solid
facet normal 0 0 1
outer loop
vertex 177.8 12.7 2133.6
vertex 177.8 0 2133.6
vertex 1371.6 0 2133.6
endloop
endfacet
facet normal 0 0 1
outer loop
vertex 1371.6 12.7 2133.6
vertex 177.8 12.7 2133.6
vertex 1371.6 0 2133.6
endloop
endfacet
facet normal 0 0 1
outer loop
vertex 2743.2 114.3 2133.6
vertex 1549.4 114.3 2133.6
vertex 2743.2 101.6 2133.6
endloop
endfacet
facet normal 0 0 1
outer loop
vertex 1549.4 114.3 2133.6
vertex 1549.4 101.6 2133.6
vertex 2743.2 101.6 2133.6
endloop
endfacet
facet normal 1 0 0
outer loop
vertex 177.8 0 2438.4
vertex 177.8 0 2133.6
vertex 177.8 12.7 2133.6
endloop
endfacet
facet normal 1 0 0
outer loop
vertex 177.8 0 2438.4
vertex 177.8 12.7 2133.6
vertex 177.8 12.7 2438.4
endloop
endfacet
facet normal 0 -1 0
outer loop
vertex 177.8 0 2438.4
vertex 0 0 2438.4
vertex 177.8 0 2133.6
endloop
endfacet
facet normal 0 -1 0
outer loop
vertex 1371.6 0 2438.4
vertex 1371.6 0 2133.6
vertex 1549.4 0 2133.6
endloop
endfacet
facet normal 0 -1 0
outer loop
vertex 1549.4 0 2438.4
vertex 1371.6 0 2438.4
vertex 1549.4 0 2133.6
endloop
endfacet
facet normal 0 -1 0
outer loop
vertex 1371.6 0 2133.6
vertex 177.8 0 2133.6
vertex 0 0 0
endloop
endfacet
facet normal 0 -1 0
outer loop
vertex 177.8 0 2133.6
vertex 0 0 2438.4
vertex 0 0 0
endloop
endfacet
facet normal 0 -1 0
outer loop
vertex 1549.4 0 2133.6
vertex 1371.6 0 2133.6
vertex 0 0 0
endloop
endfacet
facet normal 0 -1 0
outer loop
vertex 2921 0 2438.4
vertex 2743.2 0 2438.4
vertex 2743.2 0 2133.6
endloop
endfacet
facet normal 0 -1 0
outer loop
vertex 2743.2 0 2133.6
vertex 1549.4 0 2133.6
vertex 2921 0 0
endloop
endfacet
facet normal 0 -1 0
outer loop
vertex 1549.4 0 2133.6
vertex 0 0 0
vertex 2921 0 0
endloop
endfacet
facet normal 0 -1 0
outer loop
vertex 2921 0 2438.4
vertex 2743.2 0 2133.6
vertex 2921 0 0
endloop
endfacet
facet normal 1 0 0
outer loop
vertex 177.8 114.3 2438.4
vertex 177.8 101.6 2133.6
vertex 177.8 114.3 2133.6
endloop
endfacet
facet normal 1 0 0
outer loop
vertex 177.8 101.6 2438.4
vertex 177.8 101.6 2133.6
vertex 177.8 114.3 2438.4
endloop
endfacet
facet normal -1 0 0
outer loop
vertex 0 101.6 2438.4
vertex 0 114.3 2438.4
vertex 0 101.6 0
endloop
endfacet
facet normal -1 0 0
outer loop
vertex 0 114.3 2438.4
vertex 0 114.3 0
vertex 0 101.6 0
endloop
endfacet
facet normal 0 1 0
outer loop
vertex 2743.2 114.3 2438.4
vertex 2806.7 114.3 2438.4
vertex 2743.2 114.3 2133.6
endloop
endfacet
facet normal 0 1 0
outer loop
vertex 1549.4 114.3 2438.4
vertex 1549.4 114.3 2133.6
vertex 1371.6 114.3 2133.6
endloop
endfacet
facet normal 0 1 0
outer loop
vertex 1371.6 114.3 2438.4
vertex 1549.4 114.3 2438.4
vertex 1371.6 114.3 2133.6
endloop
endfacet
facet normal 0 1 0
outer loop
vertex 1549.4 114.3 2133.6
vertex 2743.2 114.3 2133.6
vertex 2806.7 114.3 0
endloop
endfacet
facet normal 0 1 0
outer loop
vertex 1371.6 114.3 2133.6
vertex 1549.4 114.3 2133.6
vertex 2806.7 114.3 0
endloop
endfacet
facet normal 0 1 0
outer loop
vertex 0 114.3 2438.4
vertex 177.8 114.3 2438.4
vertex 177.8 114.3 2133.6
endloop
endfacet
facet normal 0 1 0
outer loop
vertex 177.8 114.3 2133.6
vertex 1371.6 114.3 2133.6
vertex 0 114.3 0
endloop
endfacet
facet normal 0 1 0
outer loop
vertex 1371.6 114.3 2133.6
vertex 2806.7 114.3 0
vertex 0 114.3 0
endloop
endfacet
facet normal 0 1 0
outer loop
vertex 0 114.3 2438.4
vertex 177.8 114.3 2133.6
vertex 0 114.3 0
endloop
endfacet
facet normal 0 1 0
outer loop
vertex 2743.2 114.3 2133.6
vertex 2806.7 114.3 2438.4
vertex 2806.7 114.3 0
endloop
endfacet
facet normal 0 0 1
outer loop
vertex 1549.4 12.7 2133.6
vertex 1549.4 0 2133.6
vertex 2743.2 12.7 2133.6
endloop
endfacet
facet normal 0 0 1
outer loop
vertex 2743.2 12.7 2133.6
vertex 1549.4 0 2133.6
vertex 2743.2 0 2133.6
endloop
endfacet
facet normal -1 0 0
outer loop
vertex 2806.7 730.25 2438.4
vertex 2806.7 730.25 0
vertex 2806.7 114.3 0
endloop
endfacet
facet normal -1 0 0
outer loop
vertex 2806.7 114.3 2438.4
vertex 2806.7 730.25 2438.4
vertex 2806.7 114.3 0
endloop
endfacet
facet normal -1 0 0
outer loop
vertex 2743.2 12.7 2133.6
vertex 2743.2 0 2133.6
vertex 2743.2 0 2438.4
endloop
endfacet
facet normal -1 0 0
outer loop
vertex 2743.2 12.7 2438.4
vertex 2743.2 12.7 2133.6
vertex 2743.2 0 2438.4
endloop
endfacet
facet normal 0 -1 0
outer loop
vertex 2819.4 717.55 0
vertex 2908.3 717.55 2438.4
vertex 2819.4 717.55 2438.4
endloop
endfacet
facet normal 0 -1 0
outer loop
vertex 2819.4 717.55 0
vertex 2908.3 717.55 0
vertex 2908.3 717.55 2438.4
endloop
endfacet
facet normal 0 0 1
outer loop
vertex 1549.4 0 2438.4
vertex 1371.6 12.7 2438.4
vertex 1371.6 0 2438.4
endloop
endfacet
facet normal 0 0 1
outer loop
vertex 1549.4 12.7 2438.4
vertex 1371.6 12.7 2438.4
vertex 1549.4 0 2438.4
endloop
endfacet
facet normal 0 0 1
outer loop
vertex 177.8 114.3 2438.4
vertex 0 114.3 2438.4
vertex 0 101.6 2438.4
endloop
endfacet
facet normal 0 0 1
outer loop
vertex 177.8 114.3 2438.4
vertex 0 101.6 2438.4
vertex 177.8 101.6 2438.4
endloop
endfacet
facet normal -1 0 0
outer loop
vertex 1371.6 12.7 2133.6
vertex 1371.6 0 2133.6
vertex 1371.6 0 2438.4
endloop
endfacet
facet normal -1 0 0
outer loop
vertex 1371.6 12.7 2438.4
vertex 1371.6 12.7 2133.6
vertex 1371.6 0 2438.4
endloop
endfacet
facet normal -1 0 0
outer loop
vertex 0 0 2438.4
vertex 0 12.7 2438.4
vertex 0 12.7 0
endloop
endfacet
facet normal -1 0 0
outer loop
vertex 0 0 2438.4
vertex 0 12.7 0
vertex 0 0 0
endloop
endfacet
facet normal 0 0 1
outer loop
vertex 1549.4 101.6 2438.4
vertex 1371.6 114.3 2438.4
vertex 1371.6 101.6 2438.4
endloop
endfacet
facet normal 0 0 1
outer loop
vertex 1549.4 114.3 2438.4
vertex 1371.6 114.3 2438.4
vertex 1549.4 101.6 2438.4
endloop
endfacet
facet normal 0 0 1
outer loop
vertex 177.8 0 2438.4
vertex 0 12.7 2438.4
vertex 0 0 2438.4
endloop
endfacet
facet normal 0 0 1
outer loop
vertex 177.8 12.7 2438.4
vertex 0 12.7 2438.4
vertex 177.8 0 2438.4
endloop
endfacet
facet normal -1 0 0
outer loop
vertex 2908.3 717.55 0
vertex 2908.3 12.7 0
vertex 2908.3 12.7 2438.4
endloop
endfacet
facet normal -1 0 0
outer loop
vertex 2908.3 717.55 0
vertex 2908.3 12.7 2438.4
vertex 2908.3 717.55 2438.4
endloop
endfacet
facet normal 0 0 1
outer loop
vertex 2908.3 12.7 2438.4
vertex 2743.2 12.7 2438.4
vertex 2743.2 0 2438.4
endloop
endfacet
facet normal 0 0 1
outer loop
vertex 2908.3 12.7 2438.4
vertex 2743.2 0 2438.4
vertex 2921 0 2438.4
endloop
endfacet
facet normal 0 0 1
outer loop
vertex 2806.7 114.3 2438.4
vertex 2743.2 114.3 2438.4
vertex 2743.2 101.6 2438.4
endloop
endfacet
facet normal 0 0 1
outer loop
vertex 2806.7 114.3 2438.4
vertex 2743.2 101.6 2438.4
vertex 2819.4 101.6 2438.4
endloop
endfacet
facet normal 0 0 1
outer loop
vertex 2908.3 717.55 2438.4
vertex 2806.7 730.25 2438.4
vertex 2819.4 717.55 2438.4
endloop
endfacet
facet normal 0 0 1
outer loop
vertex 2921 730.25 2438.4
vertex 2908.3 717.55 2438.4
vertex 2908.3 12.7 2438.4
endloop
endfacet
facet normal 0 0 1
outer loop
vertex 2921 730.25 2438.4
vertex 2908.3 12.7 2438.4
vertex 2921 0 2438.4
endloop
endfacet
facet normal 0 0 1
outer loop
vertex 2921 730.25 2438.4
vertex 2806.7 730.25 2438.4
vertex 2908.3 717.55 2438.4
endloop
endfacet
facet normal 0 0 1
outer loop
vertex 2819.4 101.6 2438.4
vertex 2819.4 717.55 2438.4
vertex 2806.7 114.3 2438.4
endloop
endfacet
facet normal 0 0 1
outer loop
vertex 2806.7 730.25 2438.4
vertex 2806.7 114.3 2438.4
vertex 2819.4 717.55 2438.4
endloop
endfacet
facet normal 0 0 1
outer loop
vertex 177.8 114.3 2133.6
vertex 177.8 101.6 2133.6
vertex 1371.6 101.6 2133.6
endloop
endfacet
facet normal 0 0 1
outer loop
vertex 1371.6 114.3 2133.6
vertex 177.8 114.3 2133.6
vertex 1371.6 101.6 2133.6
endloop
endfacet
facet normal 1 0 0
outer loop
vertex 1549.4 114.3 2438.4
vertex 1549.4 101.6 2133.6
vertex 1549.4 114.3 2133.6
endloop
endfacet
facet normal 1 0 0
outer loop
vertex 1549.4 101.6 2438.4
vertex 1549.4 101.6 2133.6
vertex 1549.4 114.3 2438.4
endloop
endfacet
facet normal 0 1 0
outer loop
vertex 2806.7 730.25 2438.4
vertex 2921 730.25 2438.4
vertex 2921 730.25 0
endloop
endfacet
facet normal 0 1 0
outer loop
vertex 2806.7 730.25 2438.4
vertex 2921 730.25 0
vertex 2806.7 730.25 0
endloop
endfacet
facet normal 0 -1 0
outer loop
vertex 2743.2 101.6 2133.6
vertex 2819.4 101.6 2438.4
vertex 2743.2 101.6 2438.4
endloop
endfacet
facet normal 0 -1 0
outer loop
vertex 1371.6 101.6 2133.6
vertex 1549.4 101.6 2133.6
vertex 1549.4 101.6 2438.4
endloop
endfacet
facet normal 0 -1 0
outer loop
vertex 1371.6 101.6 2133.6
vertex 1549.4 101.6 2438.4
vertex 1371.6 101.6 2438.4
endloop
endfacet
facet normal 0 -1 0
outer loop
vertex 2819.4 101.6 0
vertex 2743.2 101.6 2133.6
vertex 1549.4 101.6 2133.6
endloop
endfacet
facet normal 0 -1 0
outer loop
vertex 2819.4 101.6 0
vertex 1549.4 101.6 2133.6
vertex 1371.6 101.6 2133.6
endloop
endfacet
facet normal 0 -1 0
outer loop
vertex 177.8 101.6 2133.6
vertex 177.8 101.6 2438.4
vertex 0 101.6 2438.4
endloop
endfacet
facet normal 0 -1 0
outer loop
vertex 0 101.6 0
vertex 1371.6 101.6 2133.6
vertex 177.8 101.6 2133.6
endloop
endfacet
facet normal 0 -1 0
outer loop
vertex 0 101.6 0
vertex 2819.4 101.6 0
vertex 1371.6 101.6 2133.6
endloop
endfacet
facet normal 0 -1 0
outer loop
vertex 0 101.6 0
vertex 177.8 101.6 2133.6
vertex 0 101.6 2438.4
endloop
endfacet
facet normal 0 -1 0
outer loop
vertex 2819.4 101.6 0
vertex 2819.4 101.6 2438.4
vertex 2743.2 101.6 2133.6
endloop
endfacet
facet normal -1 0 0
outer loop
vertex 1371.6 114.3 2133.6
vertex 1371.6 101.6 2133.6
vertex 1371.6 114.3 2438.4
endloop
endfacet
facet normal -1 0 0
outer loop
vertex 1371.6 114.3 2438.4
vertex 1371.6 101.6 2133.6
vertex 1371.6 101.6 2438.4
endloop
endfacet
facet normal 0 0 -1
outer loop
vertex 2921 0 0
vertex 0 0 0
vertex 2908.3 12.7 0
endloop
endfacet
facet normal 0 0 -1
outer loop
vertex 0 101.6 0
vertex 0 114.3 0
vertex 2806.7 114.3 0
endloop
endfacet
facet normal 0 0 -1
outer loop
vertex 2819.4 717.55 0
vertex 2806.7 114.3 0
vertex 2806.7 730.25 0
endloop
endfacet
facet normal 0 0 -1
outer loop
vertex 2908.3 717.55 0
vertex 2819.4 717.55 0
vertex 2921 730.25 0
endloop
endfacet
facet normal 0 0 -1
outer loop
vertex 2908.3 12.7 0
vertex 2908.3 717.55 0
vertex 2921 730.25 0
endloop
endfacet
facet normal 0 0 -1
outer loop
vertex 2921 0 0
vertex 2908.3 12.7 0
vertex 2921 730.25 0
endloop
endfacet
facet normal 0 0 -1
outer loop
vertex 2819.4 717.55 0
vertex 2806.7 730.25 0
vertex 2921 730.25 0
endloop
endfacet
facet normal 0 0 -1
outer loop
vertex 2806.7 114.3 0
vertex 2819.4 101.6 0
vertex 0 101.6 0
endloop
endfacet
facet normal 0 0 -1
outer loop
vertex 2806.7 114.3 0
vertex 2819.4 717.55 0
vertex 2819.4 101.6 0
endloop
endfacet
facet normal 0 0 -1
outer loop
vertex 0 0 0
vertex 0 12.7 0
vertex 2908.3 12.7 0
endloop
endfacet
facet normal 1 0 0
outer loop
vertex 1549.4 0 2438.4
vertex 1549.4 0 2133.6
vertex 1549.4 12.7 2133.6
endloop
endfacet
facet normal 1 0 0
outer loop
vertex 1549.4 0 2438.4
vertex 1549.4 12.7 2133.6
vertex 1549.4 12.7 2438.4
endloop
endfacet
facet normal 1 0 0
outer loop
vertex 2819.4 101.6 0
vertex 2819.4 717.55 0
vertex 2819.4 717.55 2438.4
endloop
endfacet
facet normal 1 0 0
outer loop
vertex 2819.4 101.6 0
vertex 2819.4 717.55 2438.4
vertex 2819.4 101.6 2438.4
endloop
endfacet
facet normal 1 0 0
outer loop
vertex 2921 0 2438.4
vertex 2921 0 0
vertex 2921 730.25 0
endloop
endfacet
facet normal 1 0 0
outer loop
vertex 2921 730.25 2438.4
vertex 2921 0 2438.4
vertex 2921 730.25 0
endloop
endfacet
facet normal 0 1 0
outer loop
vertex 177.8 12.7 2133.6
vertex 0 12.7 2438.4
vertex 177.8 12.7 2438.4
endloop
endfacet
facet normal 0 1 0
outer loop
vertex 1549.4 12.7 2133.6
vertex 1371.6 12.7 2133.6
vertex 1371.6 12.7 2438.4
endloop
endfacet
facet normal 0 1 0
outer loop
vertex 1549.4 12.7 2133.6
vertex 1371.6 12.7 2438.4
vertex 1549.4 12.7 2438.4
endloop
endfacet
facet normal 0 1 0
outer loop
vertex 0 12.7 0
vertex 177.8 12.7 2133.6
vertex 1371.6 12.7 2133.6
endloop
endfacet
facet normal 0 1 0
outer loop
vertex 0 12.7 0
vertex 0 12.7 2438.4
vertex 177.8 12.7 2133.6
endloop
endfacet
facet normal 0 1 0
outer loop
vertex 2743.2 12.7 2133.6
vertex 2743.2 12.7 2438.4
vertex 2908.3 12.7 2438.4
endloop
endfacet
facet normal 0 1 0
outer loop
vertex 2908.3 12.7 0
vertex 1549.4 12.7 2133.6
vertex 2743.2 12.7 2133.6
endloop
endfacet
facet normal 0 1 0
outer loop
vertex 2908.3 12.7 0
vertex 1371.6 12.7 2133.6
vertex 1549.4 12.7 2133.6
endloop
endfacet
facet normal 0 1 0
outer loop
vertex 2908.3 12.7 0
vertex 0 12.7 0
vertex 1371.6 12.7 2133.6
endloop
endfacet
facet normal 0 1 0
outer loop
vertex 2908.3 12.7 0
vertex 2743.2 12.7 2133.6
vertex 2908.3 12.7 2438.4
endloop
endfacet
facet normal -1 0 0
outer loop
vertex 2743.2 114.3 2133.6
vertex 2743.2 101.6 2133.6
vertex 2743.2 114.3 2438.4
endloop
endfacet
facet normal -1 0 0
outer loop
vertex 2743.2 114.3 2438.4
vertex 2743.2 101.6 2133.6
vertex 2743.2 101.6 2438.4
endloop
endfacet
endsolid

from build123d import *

# Parameters (mm, degrees)
F1_DEPTH = 2438.4
F2_W     = 1193.8
F2_H     = 304.8
F3_DEPTH = 730.251
F5_T     = -12.7


with BuildPart() as f1:
    # F0 (on Top) → F1 (new body)
    with BuildSketch(Plane.XY):
        Polygon((0, 114.3), (0, 0), (2921, 0), (2921, 730.25), (2806.7, 730.25), (2806.7, 114.3), align=None)
    extrude(amount=F1_DEPTH)

    # F2 (on face) → F3 (cut, through all)
    with BuildSketch(Plane.XZ):
        with Locations((774.7, 2286)):
            Rectangle(F2_W, F2_H)
        with Locations((2146.3, 2286)):
            Rectangle(F2_W, F2_H)
    extrude(amount=-F3_DEPTH, mode=Mode.SUBTRACT)

    # F5
    f5_openings = [f1.faces().sort_by_distance(p)[0] for p in [
        (88.9, 57.15, 2438.4),
        (1460.5, 57.15, 2438.4),
        (2856.738, 340.487, 2438.4),
        (0, 57.15, 1219.2),
        (1403.35, 84.191021, 0),
        (177.8, 57.15, 2286),
        (774.7, 57.15, 2133.6),
        (1549.4, 57.15, 2286),
        (2146.3, 57.15, 2133.6),
        (1371.6, 57.15, 2286),
        (2743.2, 57.15, 2286),
    ]]
    offset(amount=F5_T, openings=f5_openings, kind=Kind.INTERSECTION)


solid = f1.part
